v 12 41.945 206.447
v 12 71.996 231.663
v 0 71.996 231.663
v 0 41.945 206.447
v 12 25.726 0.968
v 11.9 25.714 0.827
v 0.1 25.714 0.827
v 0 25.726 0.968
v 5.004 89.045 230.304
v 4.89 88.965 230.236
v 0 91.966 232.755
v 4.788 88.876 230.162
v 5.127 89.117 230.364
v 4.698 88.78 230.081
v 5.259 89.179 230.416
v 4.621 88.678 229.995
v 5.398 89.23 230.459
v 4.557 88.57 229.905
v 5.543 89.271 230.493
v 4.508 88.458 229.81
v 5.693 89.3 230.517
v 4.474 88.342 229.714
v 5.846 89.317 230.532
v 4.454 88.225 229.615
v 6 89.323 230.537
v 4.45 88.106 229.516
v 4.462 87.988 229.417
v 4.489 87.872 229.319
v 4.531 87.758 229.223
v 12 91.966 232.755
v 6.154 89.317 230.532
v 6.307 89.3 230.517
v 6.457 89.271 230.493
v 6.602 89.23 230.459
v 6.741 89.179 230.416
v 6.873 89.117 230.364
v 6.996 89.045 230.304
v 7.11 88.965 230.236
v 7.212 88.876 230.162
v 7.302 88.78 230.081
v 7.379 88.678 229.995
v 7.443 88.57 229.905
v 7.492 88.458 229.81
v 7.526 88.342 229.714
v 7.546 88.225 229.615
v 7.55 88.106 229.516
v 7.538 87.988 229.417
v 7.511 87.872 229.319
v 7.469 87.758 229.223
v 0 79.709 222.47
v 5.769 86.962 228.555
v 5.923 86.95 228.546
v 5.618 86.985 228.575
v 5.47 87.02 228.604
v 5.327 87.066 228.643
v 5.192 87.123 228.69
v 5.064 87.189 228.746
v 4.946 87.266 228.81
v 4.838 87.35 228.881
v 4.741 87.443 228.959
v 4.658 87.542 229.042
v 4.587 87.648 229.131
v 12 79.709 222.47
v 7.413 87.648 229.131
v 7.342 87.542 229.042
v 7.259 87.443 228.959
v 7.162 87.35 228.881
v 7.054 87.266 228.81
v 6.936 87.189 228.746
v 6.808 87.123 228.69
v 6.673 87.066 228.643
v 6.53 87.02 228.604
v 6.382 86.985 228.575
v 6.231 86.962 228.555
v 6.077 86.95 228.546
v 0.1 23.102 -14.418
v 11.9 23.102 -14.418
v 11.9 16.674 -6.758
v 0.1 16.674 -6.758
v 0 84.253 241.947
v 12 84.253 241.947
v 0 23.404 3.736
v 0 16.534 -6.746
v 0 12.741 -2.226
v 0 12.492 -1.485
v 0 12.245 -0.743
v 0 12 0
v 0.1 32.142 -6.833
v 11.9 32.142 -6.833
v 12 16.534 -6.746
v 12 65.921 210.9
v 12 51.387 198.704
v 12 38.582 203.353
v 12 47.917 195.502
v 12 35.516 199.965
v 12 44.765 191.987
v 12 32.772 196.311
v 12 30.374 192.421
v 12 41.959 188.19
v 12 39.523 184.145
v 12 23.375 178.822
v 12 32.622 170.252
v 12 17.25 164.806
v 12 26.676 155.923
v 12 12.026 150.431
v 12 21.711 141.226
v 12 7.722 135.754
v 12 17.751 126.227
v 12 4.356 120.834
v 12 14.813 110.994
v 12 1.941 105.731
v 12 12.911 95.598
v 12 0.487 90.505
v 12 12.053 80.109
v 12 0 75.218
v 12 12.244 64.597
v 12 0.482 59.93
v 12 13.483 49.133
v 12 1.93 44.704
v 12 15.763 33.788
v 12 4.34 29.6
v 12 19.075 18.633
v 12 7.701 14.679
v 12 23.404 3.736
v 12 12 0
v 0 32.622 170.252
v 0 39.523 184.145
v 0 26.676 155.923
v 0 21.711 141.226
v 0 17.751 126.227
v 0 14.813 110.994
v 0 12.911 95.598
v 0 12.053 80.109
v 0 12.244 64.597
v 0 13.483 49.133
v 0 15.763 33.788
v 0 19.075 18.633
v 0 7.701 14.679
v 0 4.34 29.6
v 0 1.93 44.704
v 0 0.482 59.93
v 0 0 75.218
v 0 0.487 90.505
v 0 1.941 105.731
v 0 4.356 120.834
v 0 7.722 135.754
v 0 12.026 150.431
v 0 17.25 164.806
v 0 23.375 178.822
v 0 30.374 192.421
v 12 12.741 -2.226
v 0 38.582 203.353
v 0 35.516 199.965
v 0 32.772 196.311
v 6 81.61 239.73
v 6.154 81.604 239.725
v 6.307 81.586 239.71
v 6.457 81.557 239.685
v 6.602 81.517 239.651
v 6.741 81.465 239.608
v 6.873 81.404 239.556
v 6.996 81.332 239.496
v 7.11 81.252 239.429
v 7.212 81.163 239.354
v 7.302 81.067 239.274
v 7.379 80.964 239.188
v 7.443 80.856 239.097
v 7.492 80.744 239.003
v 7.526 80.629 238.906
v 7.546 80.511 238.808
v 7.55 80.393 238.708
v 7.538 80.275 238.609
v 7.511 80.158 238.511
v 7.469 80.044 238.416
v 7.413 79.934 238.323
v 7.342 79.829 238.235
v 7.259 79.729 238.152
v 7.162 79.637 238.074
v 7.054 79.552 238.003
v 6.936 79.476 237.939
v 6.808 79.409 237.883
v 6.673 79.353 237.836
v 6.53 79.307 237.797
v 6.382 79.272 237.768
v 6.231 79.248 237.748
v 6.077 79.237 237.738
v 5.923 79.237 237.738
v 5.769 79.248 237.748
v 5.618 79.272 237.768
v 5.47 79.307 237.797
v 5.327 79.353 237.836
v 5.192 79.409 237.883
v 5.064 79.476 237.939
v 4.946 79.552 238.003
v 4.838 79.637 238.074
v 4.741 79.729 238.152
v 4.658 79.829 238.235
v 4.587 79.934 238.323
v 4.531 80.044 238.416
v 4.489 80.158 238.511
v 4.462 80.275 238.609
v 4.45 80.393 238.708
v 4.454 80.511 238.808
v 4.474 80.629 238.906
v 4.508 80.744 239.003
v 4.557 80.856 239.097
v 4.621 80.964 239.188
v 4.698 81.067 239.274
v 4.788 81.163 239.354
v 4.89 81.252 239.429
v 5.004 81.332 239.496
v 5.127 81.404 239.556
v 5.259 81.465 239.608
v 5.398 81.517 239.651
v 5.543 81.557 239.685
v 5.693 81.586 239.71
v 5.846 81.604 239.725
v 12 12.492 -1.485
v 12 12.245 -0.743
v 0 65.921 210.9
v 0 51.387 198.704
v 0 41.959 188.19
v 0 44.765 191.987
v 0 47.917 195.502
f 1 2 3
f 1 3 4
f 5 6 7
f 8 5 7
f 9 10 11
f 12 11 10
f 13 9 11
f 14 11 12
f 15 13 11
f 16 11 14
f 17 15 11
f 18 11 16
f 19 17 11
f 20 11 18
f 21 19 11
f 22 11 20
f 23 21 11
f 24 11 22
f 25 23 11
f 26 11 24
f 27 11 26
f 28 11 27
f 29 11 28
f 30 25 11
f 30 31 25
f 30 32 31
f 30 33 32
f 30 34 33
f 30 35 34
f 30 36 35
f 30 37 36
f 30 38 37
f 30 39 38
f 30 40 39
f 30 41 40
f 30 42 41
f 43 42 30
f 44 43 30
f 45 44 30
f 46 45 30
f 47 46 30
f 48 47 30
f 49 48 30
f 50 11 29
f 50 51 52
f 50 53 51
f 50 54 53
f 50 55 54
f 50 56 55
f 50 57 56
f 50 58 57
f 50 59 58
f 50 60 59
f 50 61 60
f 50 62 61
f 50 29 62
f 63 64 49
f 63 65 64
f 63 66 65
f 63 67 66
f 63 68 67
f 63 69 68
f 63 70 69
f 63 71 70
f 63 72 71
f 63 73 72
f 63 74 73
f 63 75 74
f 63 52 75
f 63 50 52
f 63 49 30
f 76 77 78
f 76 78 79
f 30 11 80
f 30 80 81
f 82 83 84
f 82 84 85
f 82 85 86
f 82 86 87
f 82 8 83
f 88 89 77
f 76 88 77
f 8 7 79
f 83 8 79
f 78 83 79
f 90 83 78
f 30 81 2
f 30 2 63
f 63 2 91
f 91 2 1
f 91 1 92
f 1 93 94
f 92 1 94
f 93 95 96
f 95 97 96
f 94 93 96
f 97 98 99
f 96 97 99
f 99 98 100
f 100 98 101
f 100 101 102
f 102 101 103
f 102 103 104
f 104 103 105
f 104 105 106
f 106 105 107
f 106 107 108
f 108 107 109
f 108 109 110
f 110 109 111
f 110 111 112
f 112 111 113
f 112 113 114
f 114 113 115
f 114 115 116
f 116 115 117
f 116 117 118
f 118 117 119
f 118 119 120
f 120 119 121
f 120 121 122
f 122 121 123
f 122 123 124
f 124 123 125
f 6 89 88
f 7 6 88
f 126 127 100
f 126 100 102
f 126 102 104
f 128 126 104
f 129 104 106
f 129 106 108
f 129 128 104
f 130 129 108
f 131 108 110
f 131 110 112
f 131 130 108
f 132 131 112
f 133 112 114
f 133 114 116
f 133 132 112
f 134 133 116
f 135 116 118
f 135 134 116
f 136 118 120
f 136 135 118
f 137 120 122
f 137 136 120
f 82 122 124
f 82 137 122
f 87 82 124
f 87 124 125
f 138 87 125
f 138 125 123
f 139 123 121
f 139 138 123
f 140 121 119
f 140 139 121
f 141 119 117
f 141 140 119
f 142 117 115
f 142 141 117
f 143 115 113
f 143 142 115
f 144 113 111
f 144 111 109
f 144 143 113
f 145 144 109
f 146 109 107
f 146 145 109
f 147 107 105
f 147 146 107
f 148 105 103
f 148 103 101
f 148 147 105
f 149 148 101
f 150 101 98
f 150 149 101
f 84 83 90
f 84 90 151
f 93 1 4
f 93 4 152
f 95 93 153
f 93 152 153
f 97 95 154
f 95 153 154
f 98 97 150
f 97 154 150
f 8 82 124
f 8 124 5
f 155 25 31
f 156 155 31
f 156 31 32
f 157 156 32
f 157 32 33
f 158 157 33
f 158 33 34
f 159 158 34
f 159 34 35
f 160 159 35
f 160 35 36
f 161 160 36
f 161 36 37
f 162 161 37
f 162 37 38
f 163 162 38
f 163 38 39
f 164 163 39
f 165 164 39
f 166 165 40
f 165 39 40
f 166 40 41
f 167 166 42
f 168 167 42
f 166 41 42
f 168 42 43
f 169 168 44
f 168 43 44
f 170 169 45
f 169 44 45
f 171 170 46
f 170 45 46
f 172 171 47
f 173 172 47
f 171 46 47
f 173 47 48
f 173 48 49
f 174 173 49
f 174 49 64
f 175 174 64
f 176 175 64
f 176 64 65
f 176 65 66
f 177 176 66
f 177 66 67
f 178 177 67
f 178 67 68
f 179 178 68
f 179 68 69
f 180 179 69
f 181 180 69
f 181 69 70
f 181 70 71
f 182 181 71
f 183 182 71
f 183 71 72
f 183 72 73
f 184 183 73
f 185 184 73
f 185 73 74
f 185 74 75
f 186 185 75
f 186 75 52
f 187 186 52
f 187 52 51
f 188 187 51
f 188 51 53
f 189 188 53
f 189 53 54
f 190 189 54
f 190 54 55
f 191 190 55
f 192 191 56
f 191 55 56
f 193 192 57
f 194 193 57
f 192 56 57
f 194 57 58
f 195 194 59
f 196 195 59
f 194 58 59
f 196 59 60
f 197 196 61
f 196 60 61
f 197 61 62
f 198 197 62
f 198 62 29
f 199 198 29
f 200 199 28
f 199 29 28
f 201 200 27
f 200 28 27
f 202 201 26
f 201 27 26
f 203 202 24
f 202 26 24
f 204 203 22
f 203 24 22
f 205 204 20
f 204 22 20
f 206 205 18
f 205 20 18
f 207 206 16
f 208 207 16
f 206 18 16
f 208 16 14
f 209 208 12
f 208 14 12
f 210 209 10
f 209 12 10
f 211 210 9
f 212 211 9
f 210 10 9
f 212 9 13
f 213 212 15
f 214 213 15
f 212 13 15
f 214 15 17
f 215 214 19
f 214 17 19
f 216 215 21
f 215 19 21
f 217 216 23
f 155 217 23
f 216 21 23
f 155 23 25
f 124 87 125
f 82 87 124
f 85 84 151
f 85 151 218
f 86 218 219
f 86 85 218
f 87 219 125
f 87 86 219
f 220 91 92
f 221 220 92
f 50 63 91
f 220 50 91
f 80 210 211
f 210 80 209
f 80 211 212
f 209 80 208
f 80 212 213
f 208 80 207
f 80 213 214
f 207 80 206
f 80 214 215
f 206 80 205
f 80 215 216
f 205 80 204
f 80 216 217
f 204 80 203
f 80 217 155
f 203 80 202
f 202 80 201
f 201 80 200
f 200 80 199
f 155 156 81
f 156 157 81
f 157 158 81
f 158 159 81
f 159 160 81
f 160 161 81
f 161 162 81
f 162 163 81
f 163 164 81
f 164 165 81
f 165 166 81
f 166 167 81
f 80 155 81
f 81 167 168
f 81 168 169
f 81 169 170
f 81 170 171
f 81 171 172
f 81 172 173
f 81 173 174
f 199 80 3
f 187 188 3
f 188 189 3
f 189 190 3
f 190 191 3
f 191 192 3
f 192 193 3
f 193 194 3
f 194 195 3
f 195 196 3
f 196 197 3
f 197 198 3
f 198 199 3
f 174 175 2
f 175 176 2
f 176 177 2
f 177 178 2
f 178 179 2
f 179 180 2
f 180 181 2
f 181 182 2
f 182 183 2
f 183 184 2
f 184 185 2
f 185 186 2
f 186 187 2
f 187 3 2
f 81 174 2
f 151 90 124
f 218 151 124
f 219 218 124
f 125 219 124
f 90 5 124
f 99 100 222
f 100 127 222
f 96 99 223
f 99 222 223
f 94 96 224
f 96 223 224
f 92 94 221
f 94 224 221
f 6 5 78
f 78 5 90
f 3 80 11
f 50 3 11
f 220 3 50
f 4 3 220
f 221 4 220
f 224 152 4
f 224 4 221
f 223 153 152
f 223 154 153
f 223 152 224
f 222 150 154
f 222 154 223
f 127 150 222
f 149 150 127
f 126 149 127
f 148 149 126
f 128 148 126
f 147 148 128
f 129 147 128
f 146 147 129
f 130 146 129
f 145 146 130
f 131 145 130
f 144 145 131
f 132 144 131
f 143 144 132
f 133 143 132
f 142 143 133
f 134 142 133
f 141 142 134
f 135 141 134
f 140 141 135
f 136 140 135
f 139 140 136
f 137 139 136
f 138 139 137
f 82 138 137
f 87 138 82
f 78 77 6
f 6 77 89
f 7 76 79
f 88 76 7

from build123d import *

# Parameters (mm, degrees)
AUFSATZ_LINEAR_AUSTRAGEN1_DEPTH = 12
AUFSATZ_LINEAR_AUSTRAGEN3_DEPTH = 12
AUFSATZ_LINEAR_AUSTRAGEN4_DEPTH = 12
SCHNITT_LINEAR_AUSTRAGEN1_DEPTH = 254.175024926
VERRUNDUNG1_R                   = 50
SKIZZE9_W                       = 12
SKIZZE9_H                       = 12
AUFSATZ_LINEAR_AUSTRAGEN6_DEPTH = 16
SKIZZE10_R                      = 9.036348878
SKIZZE10_W                      = 11.8
SKIZZE10_H                      = 11.8
SCHNITT_LINEAR_AUSTRAGEN3_DEPTH = 10
SKIZZE11_R                      = 1.55
SCHNITT_LINEAR_AUSTRAGEN4_DEPTH = 227.398704326
FASE1_SIZE                      = 0.1


with BuildPart() as part:
    # Skizze1 → Aufsatz-Linear austragen1 (new body)
    with BuildSketch(Plane(origin=(0, 0, 0), x_dir=(0, 0, -1), z_dir=(1, 0, 0))):
        with BuildLine():
            Line((-240, 65), (-230.735708163, 72.773663864))
            ThreePointArc((-230.735708163, 72.773663864), (-123.944567763, 17.242039243), (-3.735818811, 23.403668612))
            Line((-3.735818811, 23.403668612), (0, 12))
            ThreePointArc((0, 12), (-127.247502729, 5.681119716), (-240, 65))
        make_face()
    extrude(amount=AUFSATZ_LINEAR_AUSTRAGEN1_DEPTH)

    # Skizze5 → Aufsatz-Linear austragen4 (add)
    with BuildSketch(Plane(origin=(12, 0, 0), x_dir=(0, 0, -1), z_dir=(1, 0, 0))):
        Polygon((-231.662517154, 71.995978781), (-222.469983836, 79.709430098), (-210.899806862, 65.920630121), (-192.948331238, 44.526894555), (-220.092340179, 58.207178805), align=None)
    extrude(amount=-AUFSATZ_LINEAR_AUSTRAGEN4_DEPTH)

    # Skizze6 → Schnitt-Linear austragen1 (cut, through all)
    with BuildSketch(Plane(origin=(12, 0, 0), x_dir=(0, 0, -1), z_dir=(1, 0, 0))):
        Polygon((-231.662517154, 71.995978781), (-199.510648028, 33.678873242), (-204.367668784, 29.603348917), (-240, 65), align=None)
    extrude(amount=-SCHNITT_LINEAR_AUSTRAGEN1_DEPTH, mode=Mode.SUBTRACT)

    # Verrundung1
    verrundung1_edges = [part.edges().sort_by_distance(p)[0] for p in [
        (6, 44.526894555, 192.948331238),
        (6, 35.285406895, 200.858689823),
    ]]
    fillet(verrundung1_edges, radius=VERRUNDUNG1_R)

    # Skizze9 → Aufsatz-Linear austragen6 (add)
    with BuildSketch(Plane(origin=(0, 156.320496136, 131.168470653), x_dir=(1, 0, 0), z_dir=(0, 0.7660444431189836, 0.6427876096865328))):
        with Locations((6, -125.185660837)):
            Rectangle(SKIZZE9_W, SKIZZE9_H)
    extrude(amount=AUFSATZ_LINEAR_AUSTRAGEN6_DEPTH)

    # Skizze11 → Schnitt-Linear austragen4 (cut, through all)
    with BuildSketch(Plane(origin=(0, -76.611066038, 91.301513183), x_dir=(-1, 0, 0), z_dir=(0, 0.6427876096865329, -0.7660444431189836))):
        with Locations(Location((-6, 215.061915128, 0), (0, 0, 90))):
            Circle(SKIZZE11_R)
    extrude(amount=-SCHNITT_LINEAR_AUSTRAGEN4_DEPTH, mode=Mode.SUBTRACT)


with BuildPart() as body_2:
    # Skizze4 → Aufsatz-Linear austragen3 (new body)
    with BuildSketch(Plane(origin=(0, 0, 0), x_dir=(0, 0, -1), z_dir=(1, 0, 0))):
        with BuildLine():
            Line((-3.735818811, 23.403668612), (6.769031275, 32.218284445))
            Line((6.769031275, 32.218284445), (14.482482591, 23.025751128))
            Line((14.482482591, 23.025751128), (2.225771501, 12.741149373))
            ThreePointArc((2.225771501, 12.741149373), (1.113785782, 12.367871772), (0, 12))
            Line((0, 12), (-3.735818811, 23.403668612))
        make_face()
    extrude(amount=AUFSATZ_LINEAR_AUSTRAGEN3_DEPTH)

    # Skizze10 → Schnitt-Linear austragen3 (cut)
    with BuildSketch(Plane(origin=(0, 16.644916272, -19.836638765), x_dir=(-1, 0, 0), z_dir=(0, 0.6427876096865353, -0.7660444431189815))):
        with Locations((-6, 14.329588333)):
            Circle(SKIZZE10_R)
        with Locations((-6, 14.329588333)):
            Rectangle(SKIZZE10_W, SKIZZE10_H, mode=Mode.SUBTRACT)
    extrude(amount=-SCHNITT_LINEAR_AUSTRAGEN3_DEPTH, mode=Mode.SUBTRACT)

    # Fase1
    fase1_edges = [body_2.edges().sort_by_distance(p)[0] for p in [
        (0, 21.194141689, -2.965312502),
        (6, 16.597875031, -6.82203816),
        (6, 25.790408348, 0.891413156),
        (12, 21.194141689, -2.965312502),
    ]]
    chamfer(fase1_edges, length=FASE1_SIZE - 0.0001)  # a hair under: the kernel refuses the full size


solid = Compound([part.part, body_2.part])
